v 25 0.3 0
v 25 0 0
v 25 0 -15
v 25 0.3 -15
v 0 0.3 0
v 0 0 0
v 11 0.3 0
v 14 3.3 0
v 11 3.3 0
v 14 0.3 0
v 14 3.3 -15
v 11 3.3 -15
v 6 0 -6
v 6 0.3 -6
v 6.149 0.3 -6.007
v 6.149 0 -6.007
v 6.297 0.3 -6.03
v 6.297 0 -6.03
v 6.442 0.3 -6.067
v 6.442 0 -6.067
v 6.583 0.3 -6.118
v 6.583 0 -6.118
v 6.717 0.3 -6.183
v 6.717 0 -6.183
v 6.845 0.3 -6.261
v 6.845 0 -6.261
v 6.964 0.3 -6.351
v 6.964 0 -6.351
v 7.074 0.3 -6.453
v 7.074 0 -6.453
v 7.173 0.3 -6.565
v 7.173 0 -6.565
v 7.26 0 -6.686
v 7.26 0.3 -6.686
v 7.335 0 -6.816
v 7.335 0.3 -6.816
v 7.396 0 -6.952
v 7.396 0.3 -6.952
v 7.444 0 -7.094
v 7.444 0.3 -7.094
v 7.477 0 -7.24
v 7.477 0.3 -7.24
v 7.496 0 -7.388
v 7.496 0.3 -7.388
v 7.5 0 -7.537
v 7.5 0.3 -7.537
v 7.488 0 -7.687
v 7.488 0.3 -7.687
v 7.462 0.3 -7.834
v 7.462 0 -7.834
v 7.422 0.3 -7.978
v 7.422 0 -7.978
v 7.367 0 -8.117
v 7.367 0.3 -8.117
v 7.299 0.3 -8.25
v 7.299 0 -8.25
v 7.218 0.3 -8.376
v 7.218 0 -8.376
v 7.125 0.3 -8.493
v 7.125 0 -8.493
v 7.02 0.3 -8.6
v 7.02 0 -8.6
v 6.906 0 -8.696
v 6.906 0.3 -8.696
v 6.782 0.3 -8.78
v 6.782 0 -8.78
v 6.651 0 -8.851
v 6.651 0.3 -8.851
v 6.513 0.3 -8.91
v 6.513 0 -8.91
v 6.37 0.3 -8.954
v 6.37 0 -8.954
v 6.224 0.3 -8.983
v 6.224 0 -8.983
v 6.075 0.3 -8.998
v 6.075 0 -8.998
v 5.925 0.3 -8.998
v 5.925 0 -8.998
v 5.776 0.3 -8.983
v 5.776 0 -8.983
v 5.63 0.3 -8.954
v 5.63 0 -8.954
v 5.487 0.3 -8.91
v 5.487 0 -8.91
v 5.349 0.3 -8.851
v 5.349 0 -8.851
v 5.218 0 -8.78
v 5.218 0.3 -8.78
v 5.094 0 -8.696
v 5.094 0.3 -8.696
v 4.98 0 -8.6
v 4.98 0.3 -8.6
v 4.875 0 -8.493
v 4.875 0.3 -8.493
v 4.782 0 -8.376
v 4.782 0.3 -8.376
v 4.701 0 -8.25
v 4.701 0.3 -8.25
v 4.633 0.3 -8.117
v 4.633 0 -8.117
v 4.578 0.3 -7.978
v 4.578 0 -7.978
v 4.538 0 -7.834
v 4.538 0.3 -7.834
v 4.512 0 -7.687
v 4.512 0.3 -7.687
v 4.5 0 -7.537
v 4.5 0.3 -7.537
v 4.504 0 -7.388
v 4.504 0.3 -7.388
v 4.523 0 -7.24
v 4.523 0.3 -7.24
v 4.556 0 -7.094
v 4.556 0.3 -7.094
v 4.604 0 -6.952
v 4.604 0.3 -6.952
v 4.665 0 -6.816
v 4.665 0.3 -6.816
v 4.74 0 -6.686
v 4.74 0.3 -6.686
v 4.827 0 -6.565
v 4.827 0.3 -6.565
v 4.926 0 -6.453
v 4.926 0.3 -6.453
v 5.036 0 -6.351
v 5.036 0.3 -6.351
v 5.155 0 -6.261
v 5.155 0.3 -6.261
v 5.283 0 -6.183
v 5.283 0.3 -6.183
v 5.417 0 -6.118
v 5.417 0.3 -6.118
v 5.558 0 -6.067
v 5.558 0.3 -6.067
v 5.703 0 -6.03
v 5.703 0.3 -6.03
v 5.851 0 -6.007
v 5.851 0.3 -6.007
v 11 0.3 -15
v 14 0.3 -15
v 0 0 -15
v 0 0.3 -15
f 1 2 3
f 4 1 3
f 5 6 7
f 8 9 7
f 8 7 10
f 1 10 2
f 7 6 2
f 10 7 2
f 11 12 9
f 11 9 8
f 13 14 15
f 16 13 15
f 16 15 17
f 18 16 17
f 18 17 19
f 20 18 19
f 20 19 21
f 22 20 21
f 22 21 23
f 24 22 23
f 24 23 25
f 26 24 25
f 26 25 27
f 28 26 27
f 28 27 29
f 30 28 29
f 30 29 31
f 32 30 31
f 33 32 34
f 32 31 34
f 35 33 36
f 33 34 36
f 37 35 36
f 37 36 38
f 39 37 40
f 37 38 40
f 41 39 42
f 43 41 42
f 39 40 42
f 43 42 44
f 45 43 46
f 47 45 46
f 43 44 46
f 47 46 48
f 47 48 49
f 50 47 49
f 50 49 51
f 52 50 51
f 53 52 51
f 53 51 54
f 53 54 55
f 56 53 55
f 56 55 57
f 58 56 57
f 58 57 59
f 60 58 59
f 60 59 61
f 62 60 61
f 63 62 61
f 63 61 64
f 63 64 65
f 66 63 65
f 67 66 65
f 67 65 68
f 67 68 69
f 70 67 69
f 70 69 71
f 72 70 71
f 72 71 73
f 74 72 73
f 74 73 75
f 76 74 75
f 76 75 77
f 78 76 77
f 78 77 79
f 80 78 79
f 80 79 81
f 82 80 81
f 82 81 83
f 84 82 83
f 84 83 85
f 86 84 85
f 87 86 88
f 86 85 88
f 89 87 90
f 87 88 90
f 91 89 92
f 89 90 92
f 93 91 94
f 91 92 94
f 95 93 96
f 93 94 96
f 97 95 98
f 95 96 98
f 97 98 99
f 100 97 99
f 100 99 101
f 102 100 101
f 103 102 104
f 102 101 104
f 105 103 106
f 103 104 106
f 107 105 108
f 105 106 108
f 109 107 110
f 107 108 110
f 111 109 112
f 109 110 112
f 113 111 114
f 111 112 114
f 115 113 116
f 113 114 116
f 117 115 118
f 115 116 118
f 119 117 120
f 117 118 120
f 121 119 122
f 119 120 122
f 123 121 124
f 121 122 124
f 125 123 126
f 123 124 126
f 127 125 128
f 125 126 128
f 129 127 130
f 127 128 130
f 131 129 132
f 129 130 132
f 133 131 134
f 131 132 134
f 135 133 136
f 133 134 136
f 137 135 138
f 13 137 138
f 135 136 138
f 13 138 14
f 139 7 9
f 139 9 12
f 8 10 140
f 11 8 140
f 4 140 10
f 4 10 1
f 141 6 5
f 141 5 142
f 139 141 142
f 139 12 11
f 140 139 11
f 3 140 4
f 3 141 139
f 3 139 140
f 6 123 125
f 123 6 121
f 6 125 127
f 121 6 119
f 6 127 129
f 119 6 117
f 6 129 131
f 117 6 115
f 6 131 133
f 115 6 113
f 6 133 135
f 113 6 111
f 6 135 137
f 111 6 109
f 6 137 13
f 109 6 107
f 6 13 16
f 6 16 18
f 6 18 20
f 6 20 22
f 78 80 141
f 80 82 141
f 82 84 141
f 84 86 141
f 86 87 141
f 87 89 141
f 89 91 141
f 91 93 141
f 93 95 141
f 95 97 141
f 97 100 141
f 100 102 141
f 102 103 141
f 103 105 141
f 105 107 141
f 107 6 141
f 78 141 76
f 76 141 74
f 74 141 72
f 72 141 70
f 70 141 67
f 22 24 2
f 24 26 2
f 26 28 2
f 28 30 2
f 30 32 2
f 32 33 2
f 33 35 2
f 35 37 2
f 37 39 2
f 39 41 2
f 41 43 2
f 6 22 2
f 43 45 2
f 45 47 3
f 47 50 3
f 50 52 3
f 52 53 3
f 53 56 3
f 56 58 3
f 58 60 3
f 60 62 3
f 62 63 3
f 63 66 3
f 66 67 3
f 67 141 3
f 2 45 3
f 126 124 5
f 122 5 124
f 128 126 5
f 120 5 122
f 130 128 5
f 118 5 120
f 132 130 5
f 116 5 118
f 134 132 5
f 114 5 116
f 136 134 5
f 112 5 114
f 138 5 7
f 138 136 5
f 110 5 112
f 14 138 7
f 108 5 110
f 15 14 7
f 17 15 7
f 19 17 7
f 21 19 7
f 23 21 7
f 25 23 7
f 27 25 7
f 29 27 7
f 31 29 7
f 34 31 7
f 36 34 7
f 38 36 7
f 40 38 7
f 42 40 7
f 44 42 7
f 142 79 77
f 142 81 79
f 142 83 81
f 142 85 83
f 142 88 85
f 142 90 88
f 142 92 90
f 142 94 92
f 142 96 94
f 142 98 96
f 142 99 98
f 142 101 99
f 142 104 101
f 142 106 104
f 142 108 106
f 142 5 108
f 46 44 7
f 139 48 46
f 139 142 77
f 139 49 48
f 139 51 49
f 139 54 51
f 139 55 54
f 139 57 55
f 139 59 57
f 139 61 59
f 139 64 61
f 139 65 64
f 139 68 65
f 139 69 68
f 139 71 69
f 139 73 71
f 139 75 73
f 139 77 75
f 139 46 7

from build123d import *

# Parameters (mm, degrees)
SKETCH1_W           = 25
SKETCH1_H           = 15
BOSS_EXTRUDE1_DEPTH = 0.3
SKETCH2_W           = 3
SKETCH2_H           = 15
BOSS_EXTRUDE2_DEPTH = 3
SKETCH2_5_R         = 1.5
CUT_EXTRUDE1_DEPTH  = 3


with BuildPart() as part:
    # Sketch1 → Boss-Extrude1 (new body)
    with BuildSketch(Plane(origin=(0, 0, 0), x_dir=(1, 0, 0), z_dir=(0, 1, 0))):
        with Locations((12.5, 7.5)):
            Rectangle(SKETCH1_W, SKETCH1_H)
    extrude(amount=BOSS_EXTRUDE1_DEPTH)

    # Sketch2 → Boss-Extrude2 (add)
    with BuildSketch(Plane(origin=(0, 0.3, 0), x_dir=(1, 0, 0), z_dir=(0, 1, 0))):
        with Locations((12.5, 7.5)):
            Rectangle(SKETCH2_W, SKETCH2_H)
    extrude(amount=BOSS_EXTRUDE2_DEPTH)

    # Sketch2<5> → Cut-Extrude1 (cut)
    with BuildSketch(Plane(origin=(0, 0.3, 0), x_dir=(1, 0, 0), z_dir=(0, 1, 0))):
        with Locations((6, 7.5)):
            Circle(SKETCH2_5_R)
    extrude(amount=-CUT_EXTRUDE1_DEPTH, mode=Mode.SUBTRACT)


solid = part.part
